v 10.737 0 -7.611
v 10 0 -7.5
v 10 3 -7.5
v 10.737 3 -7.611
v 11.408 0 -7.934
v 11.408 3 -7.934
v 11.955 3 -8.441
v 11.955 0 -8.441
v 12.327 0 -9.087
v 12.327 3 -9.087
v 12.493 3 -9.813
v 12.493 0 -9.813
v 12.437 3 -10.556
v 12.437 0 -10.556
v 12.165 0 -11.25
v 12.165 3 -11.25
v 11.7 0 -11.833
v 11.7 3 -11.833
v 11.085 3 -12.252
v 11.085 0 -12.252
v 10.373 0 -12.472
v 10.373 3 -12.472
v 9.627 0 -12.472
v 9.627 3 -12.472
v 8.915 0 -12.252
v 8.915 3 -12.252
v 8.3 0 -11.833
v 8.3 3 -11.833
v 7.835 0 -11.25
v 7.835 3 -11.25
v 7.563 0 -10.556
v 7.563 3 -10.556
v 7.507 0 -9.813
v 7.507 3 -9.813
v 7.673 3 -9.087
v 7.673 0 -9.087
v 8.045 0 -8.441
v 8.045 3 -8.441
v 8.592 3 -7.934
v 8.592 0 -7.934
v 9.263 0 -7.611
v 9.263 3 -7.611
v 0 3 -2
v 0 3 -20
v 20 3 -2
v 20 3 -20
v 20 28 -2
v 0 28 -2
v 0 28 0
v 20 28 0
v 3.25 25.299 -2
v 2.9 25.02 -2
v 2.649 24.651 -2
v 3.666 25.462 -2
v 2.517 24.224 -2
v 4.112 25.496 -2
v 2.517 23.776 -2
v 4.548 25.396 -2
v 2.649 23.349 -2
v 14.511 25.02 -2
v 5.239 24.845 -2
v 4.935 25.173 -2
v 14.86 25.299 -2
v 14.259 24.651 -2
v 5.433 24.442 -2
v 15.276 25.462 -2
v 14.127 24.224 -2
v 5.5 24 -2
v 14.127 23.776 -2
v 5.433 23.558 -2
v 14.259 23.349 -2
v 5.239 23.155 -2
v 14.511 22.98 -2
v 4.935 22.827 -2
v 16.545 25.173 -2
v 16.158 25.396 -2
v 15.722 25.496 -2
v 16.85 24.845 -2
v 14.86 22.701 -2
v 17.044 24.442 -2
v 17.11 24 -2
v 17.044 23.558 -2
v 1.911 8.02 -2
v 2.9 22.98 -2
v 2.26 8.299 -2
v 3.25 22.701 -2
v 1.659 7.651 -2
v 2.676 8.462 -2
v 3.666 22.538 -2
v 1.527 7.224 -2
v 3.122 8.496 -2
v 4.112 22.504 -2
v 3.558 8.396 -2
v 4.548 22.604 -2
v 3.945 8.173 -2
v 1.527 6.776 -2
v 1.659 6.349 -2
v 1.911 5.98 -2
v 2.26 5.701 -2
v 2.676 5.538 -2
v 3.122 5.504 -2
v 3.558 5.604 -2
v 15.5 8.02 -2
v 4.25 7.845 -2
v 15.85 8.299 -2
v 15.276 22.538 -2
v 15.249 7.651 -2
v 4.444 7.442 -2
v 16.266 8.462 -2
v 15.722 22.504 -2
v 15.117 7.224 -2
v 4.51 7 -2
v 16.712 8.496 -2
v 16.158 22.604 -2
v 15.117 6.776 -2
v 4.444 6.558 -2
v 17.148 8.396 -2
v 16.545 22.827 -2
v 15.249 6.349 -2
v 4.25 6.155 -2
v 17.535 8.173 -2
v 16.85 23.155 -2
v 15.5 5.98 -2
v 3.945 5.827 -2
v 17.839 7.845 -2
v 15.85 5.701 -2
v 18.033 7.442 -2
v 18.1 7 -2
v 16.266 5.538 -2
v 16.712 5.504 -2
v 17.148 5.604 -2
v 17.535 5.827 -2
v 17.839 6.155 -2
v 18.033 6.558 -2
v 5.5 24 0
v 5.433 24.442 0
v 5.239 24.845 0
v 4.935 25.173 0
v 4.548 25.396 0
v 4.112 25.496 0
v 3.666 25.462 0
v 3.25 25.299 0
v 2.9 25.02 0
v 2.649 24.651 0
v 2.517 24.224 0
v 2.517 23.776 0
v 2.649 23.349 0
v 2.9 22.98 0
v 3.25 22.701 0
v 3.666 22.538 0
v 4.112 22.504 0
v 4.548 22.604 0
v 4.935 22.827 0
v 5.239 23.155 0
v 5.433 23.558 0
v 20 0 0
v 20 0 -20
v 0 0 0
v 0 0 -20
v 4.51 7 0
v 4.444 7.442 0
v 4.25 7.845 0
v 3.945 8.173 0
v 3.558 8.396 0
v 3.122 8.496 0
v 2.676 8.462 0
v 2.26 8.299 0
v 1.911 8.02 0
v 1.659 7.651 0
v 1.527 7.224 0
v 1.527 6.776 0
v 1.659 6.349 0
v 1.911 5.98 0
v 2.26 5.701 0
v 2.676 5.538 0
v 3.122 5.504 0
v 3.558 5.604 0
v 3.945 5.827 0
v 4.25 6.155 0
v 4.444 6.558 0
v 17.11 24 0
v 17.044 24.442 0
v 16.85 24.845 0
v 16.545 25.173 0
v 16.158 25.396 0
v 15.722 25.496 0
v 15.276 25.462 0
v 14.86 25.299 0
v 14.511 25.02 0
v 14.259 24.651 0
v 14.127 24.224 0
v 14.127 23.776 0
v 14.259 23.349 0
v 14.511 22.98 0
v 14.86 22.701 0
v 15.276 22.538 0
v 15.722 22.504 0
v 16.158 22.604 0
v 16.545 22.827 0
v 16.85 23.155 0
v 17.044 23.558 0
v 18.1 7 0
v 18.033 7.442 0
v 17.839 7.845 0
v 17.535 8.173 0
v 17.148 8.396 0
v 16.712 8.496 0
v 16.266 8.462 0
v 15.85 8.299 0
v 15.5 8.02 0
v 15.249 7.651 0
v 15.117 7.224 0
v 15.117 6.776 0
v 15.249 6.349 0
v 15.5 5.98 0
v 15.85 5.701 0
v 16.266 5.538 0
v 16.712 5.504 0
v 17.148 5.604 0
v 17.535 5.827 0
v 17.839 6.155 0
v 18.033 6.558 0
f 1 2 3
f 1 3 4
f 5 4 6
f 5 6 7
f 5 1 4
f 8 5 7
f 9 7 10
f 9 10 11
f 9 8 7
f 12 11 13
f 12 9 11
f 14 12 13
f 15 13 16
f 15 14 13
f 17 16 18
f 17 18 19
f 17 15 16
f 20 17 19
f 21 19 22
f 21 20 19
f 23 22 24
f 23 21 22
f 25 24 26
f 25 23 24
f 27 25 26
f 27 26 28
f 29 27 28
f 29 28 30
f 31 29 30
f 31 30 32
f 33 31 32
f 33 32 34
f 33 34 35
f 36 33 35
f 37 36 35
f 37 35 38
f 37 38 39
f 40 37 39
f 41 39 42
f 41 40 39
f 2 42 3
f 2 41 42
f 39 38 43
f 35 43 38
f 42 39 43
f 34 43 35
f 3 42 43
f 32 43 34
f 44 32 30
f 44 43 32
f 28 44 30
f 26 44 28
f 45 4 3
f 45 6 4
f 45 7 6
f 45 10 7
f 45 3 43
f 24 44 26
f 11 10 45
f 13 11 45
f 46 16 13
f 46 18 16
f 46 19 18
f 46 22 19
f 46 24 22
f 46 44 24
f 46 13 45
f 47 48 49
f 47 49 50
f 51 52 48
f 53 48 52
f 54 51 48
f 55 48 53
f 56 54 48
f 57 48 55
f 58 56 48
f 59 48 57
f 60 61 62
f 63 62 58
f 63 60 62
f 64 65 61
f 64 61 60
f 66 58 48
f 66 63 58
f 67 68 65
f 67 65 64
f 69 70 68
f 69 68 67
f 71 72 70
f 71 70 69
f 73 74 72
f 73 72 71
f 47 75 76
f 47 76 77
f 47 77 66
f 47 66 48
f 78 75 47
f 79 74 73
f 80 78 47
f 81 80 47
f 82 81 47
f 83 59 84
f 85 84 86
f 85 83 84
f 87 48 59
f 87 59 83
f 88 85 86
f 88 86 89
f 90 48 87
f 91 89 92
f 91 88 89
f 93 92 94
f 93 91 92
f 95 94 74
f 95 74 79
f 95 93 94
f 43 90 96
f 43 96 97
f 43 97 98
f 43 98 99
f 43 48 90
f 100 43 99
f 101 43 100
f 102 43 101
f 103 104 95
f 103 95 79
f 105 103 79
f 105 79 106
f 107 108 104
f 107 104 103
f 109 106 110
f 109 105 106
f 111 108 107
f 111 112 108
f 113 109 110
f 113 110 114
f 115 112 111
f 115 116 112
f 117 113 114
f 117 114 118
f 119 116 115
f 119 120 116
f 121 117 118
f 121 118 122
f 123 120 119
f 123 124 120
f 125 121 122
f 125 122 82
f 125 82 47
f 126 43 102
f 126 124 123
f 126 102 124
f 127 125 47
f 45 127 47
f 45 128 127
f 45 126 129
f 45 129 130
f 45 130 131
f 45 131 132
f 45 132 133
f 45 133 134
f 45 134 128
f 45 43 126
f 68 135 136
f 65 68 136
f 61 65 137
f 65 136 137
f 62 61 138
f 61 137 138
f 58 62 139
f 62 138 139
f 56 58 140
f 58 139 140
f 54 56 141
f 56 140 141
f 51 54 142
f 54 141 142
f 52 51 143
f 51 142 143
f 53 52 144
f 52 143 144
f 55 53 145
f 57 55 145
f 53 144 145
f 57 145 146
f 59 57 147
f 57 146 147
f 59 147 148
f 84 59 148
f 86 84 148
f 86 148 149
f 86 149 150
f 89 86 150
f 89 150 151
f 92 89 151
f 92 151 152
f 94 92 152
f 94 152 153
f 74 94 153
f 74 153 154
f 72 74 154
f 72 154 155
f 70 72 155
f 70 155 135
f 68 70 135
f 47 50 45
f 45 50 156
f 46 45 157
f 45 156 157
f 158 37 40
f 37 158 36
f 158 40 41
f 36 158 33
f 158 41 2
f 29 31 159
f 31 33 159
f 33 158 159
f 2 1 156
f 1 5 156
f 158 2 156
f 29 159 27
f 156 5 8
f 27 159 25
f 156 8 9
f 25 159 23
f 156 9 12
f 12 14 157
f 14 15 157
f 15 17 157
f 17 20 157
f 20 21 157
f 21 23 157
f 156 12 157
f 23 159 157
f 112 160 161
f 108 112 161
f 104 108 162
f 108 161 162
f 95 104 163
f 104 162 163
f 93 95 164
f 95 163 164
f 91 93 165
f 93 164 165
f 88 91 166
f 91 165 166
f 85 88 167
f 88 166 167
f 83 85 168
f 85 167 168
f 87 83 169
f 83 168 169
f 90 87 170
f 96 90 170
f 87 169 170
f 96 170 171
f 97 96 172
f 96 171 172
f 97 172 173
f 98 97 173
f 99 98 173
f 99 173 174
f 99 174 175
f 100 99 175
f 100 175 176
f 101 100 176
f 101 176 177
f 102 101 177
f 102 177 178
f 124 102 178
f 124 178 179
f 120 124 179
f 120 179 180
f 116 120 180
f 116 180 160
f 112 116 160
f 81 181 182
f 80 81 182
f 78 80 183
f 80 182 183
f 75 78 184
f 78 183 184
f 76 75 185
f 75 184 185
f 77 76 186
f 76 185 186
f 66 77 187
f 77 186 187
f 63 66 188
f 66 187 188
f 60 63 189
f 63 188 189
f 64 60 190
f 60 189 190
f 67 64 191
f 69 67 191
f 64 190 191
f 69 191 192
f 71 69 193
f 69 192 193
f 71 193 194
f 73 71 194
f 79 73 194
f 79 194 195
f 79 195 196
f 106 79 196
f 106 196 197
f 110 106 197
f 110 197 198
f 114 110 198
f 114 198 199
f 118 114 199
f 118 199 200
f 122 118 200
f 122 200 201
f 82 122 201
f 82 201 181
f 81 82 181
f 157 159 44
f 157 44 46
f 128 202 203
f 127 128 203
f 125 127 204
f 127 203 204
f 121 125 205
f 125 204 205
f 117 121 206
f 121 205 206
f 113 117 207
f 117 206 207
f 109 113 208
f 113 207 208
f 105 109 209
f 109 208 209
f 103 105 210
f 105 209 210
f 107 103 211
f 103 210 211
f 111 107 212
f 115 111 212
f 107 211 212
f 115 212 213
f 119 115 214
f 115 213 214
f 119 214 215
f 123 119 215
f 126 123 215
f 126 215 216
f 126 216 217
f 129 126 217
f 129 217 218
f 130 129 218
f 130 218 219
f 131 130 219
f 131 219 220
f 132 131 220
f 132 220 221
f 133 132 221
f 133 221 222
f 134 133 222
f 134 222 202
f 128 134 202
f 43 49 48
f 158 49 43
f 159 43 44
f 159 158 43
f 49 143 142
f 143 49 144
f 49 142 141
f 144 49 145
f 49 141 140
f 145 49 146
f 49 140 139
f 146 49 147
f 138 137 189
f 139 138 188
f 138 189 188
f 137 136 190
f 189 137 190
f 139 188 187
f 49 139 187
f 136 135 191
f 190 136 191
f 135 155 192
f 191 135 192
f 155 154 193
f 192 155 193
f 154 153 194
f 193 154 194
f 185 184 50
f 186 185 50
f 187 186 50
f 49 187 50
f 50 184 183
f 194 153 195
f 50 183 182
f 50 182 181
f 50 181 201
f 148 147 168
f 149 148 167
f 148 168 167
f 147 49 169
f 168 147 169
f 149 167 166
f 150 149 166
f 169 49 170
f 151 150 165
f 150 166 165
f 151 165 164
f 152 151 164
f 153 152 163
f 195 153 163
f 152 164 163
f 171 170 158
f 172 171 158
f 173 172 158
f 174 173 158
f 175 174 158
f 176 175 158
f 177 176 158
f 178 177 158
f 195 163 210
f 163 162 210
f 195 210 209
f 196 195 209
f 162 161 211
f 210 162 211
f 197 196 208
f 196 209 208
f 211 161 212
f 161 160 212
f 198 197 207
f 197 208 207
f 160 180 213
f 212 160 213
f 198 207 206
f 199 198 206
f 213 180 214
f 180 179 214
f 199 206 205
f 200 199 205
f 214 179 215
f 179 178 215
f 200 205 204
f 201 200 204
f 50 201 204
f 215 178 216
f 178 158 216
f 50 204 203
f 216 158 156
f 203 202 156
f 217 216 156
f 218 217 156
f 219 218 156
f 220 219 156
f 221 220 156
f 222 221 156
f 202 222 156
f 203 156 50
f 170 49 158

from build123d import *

# Parameters (mm, degrees)
SKETCH1_W           = 20
SKETCH1_H           = 20
SKETCH1_R           = 2.5
BOSS_EXTRUDE1_DEPTH = 3
SKETCH2_W           = 20
SKETCH2_H           = 2
BOSS_EXTRUDE2_DEPTH = 25
SKETCH3_R           = 1.5
CUT_EXTRUDE1_DEPTH  = 25


with BuildPart() as part:
    # Sketch1 → Boss-Extrude1 (new body)
    with BuildSketch(Plane(origin=(0, 0, 0), x_dir=(1, 0, 0), z_dir=(0, 1, 0))):
        with Locations((10, 10)):
            Rectangle(SKETCH1_W, SKETCH1_H)
        with Locations(Location((10, 10, 0), (0, 0, 270))):
            Circle(SKETCH1_R, mode=Mode.SUBTRACT)
    extrude(amount=BOSS_EXTRUDE1_DEPTH)

    # Sketch2 → Boss-Extrude2 (add)
    with BuildSketch(Plane(origin=(0, 3, 0), x_dir=(1, 0, 0), z_dir=(0, 1, 0))):
        with Locations((10, 1)):
            Rectangle(SKETCH2_W, SKETCH2_H)
    extrude(amount=BOSS_EXTRUDE2_DEPTH)

    # Sketch3 → Cut-Extrude1 (cut)
    with BuildSketch(Plane.XY):
        with Locations((4, 24)):
            Circle(SKETCH3_R)
        with Locations((16.6, 7)):
            Circle(SKETCH3_R)
        with Locations((3.010167482, 7)):
            Circle(SKETCH3_R)
        with Locations((15.610167482, 24)):
            Circle(SKETCH3_R)
    extrude(amount=-CUT_EXTRUDE1_DEPTH, mode=Mode.SUBTRACT)


solid = part.part
